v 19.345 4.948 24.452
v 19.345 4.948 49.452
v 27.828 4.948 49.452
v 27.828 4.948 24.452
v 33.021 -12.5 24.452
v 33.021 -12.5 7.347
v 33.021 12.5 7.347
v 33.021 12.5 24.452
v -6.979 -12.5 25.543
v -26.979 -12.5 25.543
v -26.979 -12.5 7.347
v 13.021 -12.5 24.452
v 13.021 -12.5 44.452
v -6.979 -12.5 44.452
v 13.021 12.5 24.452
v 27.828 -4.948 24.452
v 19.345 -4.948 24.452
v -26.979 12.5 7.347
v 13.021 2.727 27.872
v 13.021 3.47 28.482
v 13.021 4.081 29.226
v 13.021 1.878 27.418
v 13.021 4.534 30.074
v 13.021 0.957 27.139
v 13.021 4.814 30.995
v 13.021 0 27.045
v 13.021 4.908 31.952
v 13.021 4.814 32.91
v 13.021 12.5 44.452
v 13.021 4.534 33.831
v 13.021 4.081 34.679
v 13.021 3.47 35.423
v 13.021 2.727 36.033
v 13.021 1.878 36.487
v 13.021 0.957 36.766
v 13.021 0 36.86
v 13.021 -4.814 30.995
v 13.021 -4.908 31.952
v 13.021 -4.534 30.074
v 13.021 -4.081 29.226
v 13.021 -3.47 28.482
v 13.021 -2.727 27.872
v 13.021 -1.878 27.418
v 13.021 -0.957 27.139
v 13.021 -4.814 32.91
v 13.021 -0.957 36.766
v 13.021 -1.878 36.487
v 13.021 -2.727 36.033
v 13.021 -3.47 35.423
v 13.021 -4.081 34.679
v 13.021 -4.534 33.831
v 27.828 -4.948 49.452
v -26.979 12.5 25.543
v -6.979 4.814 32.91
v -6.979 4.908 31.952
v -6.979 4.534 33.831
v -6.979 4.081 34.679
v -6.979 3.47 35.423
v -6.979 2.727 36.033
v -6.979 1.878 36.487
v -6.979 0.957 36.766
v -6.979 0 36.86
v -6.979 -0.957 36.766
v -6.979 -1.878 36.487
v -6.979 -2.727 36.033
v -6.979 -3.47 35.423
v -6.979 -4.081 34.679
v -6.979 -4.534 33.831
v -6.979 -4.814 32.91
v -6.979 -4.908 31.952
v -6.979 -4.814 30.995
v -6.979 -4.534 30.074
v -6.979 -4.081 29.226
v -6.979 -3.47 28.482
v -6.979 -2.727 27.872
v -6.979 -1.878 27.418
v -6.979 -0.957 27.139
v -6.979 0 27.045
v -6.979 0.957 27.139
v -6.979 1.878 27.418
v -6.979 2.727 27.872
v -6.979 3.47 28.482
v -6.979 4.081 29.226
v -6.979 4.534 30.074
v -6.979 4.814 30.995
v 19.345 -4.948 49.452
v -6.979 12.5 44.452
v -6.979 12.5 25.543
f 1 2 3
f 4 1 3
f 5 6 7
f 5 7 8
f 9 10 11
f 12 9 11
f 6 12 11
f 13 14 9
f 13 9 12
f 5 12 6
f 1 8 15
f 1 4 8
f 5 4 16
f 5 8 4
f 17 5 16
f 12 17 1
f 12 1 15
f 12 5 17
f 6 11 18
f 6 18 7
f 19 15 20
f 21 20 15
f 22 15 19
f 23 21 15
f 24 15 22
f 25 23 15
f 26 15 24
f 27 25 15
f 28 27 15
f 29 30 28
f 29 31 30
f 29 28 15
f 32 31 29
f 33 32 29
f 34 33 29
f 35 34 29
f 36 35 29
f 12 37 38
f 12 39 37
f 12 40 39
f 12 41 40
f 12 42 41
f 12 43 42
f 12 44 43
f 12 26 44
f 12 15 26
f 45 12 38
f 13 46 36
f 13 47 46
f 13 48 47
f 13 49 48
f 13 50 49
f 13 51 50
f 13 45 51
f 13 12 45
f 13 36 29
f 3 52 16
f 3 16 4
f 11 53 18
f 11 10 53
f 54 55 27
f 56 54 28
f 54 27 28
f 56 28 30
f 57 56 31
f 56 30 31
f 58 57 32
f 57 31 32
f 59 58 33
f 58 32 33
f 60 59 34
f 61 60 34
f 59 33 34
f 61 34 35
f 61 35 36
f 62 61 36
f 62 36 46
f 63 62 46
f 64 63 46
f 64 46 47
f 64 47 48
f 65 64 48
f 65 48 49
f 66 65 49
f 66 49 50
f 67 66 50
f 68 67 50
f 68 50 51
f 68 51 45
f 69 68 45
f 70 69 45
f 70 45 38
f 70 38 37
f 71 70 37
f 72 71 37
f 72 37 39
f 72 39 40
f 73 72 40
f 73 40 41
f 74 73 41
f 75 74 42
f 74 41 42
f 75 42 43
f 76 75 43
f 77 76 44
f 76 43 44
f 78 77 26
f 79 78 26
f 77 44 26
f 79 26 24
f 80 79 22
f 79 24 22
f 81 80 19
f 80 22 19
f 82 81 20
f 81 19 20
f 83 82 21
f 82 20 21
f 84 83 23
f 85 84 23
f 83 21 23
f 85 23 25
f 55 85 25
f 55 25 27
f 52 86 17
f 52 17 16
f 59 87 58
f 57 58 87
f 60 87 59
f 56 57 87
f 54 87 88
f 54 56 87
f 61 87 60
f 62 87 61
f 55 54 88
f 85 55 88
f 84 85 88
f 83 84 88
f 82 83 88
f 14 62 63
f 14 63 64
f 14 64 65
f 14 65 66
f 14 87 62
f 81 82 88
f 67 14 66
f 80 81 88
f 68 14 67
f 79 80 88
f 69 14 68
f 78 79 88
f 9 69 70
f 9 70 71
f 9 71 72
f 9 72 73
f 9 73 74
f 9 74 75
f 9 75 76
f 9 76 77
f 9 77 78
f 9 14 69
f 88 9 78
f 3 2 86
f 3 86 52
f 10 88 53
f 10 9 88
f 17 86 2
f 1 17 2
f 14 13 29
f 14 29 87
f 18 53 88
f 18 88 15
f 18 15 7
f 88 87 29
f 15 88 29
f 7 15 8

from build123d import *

# Parameters (mm, degrees)
F1_DEPTH = 12.5
F2_R     = 4.907825
F3_DEPTH = 40.001
F4_W     = 8.482946
F4_H     = 9.896773
F5_DEPTH = 25


with BuildPart() as f1:
    # F0 (on Front) → F1 (new body, symmetric)
    with BuildSketch(Plane.XZ):
        Polygon((-26.978808, 25.542999), (-26.978808, 7.346645), (33.021192, 7.346645), (33.021192, 24.45209), (13.021192, 24.45209), (13.021192, 44.452089), (-6.978808, 44.452089), (-6.978808, 25.542999), align=None)
    extrude(amount=F1_DEPTH, both=True)

    # F2 (on face) → F3 (cut, through all)
    with BuildSketch(Plane.YZ.offset(13.021192)):
        with Locations((0, 31.952426)):
            Circle(F2_R)
    extrude(amount=-F3_DEPTH, mode=Mode.SUBTRACT)

    # F4 (on face) → F5 (join)
    with BuildSketch(Plane.XY.offset(24.45209)):
        with Locations((23.586721, 0)):
            Rectangle(F4_W, F4_H)
    extrude(amount=F5_DEPTH)


solid = f1.part
